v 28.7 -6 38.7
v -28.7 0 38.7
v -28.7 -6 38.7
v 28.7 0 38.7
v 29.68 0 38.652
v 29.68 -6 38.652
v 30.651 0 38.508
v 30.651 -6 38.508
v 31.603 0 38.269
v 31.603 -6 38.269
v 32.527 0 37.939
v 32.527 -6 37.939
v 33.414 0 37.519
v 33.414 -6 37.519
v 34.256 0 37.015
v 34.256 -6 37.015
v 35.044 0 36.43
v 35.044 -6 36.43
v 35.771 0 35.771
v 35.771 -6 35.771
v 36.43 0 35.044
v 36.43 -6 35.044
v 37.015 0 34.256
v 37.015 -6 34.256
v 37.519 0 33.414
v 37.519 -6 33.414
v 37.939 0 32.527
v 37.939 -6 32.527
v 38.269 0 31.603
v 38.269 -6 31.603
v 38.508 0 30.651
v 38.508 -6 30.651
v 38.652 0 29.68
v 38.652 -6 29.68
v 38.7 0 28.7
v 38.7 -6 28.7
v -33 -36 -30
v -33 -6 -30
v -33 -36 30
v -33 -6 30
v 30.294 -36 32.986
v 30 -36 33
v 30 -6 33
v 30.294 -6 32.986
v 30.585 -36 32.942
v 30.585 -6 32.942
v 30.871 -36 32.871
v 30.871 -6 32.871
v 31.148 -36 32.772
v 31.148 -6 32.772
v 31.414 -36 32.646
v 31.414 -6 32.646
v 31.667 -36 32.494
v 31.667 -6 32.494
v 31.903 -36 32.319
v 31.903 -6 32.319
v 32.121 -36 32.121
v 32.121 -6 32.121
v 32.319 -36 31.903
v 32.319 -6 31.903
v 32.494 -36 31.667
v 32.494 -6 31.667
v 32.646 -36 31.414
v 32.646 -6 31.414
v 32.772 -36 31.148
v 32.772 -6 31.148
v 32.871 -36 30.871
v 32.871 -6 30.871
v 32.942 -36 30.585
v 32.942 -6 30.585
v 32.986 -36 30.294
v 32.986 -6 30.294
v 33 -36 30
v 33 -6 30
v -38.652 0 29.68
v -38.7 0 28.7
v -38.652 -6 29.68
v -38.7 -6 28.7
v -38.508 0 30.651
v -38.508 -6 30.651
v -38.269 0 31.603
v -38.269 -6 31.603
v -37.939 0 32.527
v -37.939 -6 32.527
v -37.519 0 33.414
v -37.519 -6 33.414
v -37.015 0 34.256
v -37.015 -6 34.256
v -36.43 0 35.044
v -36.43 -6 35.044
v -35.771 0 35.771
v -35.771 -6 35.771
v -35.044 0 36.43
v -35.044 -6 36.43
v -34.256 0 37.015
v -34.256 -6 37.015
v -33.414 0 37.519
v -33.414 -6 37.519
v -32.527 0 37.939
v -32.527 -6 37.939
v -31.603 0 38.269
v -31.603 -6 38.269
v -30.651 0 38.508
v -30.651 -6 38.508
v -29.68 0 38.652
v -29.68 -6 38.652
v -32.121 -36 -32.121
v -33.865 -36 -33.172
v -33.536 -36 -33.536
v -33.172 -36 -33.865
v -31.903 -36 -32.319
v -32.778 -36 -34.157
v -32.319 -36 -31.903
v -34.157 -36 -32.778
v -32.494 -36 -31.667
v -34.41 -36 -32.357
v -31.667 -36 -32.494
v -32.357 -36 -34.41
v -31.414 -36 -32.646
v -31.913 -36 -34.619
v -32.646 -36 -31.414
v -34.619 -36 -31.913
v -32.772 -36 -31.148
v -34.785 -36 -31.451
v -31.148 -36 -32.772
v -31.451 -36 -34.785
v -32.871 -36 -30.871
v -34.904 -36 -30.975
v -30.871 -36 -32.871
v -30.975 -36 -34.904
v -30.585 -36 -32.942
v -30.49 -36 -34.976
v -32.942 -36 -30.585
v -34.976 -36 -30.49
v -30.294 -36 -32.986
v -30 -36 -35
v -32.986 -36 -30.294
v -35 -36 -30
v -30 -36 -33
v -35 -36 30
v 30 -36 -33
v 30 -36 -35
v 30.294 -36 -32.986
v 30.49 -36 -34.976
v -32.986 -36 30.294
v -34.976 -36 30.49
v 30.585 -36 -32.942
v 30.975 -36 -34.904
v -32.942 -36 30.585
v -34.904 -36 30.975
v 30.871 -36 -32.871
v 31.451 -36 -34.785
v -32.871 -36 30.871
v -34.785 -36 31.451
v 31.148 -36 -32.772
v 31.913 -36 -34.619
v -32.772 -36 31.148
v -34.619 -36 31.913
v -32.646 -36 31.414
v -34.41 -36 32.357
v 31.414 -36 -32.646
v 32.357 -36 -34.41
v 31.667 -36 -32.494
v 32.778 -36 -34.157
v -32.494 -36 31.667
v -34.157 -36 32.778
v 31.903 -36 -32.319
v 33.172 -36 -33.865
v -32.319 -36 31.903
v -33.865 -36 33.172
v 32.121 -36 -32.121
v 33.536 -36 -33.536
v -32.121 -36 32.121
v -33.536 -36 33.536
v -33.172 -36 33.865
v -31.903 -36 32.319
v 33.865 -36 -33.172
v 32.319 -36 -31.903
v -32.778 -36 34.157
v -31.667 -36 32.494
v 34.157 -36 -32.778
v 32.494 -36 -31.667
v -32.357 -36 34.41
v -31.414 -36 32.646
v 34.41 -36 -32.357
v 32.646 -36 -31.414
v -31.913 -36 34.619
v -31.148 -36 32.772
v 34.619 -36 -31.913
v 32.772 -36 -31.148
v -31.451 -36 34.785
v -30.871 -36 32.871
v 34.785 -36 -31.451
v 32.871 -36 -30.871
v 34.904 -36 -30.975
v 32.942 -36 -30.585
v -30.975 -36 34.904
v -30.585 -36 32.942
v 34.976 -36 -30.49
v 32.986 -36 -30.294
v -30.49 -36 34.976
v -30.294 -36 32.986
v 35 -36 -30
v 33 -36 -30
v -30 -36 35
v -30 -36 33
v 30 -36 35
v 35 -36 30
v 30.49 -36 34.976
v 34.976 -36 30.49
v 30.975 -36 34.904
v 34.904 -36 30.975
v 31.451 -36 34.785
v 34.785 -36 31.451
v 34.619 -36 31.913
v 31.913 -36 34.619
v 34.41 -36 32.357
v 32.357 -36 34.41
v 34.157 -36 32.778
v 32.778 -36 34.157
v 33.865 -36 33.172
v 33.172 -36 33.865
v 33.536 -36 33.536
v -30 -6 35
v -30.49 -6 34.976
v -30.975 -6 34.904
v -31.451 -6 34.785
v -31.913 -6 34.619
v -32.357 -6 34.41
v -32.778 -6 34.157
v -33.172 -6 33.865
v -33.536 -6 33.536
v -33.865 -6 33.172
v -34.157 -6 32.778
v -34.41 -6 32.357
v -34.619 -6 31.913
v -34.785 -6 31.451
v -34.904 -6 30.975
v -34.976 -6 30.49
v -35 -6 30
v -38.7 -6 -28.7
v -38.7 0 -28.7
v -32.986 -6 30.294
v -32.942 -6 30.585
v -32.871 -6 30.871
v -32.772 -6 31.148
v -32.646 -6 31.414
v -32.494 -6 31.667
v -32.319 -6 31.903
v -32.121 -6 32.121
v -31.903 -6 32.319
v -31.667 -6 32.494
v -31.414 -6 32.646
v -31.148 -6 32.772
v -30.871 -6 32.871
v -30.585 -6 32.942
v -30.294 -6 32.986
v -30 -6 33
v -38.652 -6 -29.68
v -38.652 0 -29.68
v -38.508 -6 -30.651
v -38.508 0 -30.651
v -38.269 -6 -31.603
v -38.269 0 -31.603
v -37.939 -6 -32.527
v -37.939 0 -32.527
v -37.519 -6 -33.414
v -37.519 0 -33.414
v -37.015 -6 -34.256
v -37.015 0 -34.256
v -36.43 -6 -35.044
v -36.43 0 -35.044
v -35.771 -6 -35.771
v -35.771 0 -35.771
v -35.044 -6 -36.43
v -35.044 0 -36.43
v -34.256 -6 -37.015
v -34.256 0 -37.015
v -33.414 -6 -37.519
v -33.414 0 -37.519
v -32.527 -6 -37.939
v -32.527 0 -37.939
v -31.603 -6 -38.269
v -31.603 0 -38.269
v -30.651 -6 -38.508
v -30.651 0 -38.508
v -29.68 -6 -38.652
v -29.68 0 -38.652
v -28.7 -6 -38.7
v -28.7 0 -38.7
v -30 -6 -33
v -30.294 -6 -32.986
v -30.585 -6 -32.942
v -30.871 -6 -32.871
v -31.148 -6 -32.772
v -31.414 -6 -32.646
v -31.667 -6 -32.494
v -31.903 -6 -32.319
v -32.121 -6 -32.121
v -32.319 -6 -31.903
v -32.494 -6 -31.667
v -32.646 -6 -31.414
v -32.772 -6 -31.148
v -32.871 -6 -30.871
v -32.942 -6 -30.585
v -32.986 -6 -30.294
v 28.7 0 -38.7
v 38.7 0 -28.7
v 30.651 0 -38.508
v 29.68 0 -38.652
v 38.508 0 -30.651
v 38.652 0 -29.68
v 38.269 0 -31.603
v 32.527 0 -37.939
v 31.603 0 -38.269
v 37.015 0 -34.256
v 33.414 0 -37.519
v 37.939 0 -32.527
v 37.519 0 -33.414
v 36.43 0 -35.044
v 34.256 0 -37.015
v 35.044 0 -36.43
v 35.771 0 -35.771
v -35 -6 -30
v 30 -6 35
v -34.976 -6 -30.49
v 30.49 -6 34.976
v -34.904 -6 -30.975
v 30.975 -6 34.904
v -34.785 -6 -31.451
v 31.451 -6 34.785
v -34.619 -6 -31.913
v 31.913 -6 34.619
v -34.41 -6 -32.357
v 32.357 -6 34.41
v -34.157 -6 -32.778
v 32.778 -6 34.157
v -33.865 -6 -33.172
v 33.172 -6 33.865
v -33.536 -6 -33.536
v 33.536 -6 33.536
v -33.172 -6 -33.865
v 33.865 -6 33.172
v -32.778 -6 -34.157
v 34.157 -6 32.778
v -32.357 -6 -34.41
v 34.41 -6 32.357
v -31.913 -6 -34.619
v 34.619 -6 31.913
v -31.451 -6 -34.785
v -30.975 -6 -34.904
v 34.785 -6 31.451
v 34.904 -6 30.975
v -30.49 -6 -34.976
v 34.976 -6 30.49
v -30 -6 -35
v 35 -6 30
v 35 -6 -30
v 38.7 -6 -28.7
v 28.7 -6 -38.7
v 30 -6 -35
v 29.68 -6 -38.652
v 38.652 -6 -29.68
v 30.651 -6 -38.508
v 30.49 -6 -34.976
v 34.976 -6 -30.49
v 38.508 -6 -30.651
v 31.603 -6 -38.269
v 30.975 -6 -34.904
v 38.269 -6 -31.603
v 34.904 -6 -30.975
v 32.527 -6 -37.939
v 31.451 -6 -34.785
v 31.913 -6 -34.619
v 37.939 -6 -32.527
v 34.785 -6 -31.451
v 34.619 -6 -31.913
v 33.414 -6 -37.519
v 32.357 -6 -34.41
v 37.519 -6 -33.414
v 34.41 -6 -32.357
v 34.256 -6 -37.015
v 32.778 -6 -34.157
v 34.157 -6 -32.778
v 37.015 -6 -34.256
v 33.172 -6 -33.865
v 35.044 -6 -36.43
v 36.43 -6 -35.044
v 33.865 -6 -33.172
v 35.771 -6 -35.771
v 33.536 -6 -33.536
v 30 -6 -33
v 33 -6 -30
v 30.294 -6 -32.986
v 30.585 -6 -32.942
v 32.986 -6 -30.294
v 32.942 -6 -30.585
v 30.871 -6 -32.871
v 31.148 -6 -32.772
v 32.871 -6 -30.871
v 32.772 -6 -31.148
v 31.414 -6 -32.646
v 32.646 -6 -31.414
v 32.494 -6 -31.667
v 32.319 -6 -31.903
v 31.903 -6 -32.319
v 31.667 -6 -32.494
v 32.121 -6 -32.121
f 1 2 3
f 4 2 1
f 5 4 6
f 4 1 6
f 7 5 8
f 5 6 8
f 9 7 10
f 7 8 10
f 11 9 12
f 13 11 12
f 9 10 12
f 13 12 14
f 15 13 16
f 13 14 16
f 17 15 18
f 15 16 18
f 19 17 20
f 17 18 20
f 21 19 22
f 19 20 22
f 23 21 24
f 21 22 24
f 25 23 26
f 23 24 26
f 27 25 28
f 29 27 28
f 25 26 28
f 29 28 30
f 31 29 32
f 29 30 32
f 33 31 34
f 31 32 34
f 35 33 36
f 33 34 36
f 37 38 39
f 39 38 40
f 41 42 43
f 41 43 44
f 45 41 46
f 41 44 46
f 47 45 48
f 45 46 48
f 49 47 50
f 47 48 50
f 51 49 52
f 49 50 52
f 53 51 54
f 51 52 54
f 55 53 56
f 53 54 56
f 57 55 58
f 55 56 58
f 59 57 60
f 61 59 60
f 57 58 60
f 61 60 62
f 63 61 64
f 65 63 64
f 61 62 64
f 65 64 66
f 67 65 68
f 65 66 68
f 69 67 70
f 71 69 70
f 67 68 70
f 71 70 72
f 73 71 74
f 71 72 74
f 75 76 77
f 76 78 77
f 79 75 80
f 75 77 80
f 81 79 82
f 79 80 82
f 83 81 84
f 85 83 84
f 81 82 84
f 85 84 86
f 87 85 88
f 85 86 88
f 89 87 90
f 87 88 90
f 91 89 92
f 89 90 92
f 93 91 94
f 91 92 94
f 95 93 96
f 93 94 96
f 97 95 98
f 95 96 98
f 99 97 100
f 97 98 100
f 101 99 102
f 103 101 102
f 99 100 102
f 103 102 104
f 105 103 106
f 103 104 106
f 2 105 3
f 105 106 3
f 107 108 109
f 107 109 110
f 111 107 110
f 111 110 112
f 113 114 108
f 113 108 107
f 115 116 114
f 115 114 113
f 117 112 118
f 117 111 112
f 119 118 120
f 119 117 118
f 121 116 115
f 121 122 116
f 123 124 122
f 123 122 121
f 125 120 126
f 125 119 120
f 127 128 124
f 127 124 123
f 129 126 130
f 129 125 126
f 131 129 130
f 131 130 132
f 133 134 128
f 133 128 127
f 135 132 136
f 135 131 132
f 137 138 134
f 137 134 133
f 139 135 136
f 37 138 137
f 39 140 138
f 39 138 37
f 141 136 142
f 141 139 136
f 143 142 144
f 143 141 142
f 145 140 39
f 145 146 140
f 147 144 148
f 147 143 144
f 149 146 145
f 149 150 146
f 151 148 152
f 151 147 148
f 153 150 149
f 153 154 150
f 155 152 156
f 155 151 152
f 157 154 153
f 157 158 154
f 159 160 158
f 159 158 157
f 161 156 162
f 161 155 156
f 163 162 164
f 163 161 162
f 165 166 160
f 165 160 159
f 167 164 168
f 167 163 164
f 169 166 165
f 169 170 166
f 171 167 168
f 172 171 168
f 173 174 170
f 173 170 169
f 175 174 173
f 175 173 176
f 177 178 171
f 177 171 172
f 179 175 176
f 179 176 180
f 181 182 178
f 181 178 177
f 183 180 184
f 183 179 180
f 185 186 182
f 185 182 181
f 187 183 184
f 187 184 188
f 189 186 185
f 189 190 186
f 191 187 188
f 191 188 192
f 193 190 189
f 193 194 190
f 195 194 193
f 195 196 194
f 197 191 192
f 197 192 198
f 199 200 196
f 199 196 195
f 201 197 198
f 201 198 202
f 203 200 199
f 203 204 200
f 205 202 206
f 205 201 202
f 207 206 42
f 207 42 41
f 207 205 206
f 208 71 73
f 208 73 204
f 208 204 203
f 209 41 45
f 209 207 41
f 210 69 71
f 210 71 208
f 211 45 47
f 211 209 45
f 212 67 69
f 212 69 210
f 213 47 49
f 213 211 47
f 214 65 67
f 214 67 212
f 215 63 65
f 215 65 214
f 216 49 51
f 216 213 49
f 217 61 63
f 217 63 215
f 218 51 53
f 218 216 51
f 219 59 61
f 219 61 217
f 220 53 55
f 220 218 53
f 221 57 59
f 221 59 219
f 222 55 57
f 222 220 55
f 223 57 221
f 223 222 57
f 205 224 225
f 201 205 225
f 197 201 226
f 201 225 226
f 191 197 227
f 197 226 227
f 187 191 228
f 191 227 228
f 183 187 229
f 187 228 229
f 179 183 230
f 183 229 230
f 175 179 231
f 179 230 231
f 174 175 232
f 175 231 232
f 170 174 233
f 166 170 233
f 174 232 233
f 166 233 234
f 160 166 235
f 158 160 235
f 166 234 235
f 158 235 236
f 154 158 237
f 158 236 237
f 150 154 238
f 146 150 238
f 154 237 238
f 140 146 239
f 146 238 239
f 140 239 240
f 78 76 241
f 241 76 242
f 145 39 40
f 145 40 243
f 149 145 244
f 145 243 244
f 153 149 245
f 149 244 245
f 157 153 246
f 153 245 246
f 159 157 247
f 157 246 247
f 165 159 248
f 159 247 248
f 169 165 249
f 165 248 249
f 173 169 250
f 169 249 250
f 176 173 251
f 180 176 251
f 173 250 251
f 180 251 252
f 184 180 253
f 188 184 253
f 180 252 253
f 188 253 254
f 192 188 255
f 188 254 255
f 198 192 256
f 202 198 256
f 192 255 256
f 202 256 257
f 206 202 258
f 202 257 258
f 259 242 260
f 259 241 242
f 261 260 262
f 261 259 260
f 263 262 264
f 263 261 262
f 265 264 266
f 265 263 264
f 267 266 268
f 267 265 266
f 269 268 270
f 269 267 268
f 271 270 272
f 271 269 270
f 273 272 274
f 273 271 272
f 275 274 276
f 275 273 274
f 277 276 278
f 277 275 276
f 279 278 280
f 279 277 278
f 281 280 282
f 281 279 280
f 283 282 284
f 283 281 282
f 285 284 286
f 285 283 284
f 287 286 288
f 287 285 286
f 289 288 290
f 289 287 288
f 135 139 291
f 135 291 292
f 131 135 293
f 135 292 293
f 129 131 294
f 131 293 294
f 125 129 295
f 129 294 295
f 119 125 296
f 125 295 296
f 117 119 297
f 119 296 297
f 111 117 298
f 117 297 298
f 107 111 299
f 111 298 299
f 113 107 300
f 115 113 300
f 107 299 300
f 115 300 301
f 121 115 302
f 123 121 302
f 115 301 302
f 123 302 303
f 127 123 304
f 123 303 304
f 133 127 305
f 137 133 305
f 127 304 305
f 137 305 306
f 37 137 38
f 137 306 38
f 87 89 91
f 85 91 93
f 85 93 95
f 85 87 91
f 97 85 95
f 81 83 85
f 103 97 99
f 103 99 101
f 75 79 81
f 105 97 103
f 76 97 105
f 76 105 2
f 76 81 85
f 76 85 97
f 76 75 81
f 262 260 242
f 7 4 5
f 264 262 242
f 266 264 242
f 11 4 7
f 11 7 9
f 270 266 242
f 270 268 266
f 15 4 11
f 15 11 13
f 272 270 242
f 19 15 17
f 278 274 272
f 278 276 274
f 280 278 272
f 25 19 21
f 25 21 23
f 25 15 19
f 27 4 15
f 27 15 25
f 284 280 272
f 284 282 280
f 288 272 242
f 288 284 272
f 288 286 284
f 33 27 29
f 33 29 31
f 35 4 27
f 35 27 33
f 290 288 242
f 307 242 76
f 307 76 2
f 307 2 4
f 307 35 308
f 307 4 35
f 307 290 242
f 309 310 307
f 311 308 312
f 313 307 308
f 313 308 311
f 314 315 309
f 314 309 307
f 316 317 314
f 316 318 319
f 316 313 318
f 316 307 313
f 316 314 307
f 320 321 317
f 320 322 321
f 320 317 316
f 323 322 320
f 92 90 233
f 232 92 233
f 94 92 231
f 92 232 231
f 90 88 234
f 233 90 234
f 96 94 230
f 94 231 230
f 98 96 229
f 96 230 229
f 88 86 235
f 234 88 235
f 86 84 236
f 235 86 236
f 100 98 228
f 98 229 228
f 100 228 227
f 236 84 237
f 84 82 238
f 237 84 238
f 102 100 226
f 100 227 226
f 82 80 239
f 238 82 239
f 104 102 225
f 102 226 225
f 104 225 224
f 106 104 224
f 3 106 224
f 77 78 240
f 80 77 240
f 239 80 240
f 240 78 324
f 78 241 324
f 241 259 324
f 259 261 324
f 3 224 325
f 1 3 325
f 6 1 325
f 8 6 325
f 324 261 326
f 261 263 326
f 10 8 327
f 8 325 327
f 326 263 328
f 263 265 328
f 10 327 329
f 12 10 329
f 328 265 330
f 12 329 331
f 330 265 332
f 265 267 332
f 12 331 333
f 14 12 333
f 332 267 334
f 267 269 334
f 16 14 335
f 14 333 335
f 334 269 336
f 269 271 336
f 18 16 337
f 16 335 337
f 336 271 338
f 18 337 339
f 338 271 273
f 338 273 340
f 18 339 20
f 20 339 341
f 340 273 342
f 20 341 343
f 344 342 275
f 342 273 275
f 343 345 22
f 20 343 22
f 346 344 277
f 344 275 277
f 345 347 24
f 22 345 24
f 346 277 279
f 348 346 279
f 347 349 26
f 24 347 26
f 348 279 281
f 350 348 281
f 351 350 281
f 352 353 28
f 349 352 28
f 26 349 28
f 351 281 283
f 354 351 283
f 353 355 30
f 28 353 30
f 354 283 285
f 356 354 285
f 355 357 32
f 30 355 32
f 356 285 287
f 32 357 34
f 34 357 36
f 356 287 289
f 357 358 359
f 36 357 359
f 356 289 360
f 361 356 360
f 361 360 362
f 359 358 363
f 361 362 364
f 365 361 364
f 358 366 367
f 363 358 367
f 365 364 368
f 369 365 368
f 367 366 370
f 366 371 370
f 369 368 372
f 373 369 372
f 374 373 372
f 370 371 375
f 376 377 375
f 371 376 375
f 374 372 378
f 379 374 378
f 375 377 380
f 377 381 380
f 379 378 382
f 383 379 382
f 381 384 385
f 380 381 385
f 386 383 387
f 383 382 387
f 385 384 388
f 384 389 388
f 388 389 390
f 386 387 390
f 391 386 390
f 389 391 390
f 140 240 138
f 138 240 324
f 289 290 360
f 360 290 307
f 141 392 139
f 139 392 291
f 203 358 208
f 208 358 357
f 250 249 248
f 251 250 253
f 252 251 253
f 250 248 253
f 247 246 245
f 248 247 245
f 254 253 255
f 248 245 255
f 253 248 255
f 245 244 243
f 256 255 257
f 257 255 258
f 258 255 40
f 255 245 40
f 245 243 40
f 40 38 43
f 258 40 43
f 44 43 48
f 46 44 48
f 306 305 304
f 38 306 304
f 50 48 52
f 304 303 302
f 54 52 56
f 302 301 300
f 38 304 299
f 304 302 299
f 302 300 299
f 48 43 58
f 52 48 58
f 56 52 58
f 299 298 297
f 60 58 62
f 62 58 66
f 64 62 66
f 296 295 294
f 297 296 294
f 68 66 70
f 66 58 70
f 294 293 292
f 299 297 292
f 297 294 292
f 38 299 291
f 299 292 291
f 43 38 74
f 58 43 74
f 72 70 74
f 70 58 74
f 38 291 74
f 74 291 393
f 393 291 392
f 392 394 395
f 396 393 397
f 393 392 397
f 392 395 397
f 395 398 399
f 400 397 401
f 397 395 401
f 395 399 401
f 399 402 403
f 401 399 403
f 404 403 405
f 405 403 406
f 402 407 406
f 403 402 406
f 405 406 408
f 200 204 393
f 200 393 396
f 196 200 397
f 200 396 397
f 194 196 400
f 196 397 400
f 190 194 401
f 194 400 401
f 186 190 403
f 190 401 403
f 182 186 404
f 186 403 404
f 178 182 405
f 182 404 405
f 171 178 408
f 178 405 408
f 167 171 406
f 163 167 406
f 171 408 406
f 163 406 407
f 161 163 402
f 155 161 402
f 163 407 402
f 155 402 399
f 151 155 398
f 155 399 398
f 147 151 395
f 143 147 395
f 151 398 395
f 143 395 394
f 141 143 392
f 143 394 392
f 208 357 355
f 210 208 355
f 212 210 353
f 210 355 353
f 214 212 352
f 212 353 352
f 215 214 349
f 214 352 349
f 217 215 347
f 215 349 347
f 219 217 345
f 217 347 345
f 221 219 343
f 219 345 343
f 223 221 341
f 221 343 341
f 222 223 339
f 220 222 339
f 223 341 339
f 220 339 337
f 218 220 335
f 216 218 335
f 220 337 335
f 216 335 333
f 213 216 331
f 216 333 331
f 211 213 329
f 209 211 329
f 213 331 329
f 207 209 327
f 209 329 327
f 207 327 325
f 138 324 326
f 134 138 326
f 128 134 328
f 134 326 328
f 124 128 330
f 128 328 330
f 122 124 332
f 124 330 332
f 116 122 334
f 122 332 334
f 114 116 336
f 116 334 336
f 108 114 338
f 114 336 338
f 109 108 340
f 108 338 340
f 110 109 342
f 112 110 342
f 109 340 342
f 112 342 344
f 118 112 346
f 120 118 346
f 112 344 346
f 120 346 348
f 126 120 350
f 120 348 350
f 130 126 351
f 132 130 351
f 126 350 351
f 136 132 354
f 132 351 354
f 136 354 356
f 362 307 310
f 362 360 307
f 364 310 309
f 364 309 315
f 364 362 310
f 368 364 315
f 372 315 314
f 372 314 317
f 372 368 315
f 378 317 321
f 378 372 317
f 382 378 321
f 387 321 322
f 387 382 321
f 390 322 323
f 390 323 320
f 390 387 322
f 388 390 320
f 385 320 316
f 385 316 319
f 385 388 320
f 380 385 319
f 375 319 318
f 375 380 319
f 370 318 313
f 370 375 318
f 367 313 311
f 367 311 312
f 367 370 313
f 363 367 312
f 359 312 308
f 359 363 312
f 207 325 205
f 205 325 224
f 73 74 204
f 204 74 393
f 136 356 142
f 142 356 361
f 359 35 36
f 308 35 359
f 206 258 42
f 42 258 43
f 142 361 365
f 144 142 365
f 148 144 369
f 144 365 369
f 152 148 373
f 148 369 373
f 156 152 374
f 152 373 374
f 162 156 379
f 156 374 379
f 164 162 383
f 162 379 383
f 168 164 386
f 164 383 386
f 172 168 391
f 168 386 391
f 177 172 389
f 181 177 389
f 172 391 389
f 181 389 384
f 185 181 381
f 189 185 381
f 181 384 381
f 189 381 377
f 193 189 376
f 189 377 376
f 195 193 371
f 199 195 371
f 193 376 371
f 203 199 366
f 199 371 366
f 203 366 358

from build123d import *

# Parameters (mm, degrees)
SZKIC1_W                    = 77.4
SZKIC1_H                    = 77.4
DODANIE_WYCI_GNI_CIE1_DEPTH = 6
DODANIE_WYCI_GNI_CIE2_DEPTH = 30
ZAOKR_GLENIE1_R             = 10


with BuildPart() as part:
    # Szkic1 → Dodanie-wyciągnięcie1 (new body)
    with BuildSketch(Plane(origin=(0, 0, 0), x_dir=(1, 0, 0), z_dir=(0, 1, 0))):
        Rectangle(SZKIC1_W, SZKIC1_H)
    extrude(amount=-DODANIE_WYCI_GNI_CIE1_DEPTH)

    # Szkic2 → Dodanie-wyciągnięcie2 (add)
    with BuildSketch(Plane.XZ.offset(6)):
        with BuildLine():
            Line((-30, -35), (30, -35))
            ThreePointArc((30, -35), (33.535533906, -33.535533906), (35, -30))
            Line((35, -30), (35, 30))
            ThreePointArc((35, 30), (33.535533906, 33.535533906), (30, 35))
            Line((30, 35), (-30, 35))
            ThreePointArc((-30, 35), (-33.535533906, 33.535533906), (-35, 30))
            Line((-35, 30), (-35, -30))
            ThreePointArc((-35, -30), (-33.535533906, -33.535533906), (-30, -35))
        make_face()
        with BuildLine():
            Line((-33, -30), (-33, 30))
            ThreePointArc((-33, 30), (-32.121320344, 32.121320344), (-30, 33))
            Line((-30, 33), (30, 33))
            ThreePointArc((30, 33), (32.121320344, 32.121320344), (33, 30))
            Line((33, 30), (33, -30))
            ThreePointArc((33, -30), (32.121320344, -32.121320344), (30, -33))
            Line((30, -33), (-30, -33))
            ThreePointArc((-30, -33), (-32.121320344, -32.121320344), (-33, -30))
        make_face(mode=Mode.SUBTRACT)
    extrude(amount=DODANIE_WYCI_GNI_CIE2_DEPTH)

    # Zaokrąglenie1
    zaokr_glenie1_edges = [part.edges().sort_by_distance(p)[0] for p in [
        (38.7, -3, 38.7),
        (-38.7, -3, 38.7),
        (-38.7, -3, -38.7),
        (38.7, -3, -38.7),
    ]]
    fillet(zaokr_glenie1_edges, radius=ZAOKR_GLENIE1_R)


solid = part.part
